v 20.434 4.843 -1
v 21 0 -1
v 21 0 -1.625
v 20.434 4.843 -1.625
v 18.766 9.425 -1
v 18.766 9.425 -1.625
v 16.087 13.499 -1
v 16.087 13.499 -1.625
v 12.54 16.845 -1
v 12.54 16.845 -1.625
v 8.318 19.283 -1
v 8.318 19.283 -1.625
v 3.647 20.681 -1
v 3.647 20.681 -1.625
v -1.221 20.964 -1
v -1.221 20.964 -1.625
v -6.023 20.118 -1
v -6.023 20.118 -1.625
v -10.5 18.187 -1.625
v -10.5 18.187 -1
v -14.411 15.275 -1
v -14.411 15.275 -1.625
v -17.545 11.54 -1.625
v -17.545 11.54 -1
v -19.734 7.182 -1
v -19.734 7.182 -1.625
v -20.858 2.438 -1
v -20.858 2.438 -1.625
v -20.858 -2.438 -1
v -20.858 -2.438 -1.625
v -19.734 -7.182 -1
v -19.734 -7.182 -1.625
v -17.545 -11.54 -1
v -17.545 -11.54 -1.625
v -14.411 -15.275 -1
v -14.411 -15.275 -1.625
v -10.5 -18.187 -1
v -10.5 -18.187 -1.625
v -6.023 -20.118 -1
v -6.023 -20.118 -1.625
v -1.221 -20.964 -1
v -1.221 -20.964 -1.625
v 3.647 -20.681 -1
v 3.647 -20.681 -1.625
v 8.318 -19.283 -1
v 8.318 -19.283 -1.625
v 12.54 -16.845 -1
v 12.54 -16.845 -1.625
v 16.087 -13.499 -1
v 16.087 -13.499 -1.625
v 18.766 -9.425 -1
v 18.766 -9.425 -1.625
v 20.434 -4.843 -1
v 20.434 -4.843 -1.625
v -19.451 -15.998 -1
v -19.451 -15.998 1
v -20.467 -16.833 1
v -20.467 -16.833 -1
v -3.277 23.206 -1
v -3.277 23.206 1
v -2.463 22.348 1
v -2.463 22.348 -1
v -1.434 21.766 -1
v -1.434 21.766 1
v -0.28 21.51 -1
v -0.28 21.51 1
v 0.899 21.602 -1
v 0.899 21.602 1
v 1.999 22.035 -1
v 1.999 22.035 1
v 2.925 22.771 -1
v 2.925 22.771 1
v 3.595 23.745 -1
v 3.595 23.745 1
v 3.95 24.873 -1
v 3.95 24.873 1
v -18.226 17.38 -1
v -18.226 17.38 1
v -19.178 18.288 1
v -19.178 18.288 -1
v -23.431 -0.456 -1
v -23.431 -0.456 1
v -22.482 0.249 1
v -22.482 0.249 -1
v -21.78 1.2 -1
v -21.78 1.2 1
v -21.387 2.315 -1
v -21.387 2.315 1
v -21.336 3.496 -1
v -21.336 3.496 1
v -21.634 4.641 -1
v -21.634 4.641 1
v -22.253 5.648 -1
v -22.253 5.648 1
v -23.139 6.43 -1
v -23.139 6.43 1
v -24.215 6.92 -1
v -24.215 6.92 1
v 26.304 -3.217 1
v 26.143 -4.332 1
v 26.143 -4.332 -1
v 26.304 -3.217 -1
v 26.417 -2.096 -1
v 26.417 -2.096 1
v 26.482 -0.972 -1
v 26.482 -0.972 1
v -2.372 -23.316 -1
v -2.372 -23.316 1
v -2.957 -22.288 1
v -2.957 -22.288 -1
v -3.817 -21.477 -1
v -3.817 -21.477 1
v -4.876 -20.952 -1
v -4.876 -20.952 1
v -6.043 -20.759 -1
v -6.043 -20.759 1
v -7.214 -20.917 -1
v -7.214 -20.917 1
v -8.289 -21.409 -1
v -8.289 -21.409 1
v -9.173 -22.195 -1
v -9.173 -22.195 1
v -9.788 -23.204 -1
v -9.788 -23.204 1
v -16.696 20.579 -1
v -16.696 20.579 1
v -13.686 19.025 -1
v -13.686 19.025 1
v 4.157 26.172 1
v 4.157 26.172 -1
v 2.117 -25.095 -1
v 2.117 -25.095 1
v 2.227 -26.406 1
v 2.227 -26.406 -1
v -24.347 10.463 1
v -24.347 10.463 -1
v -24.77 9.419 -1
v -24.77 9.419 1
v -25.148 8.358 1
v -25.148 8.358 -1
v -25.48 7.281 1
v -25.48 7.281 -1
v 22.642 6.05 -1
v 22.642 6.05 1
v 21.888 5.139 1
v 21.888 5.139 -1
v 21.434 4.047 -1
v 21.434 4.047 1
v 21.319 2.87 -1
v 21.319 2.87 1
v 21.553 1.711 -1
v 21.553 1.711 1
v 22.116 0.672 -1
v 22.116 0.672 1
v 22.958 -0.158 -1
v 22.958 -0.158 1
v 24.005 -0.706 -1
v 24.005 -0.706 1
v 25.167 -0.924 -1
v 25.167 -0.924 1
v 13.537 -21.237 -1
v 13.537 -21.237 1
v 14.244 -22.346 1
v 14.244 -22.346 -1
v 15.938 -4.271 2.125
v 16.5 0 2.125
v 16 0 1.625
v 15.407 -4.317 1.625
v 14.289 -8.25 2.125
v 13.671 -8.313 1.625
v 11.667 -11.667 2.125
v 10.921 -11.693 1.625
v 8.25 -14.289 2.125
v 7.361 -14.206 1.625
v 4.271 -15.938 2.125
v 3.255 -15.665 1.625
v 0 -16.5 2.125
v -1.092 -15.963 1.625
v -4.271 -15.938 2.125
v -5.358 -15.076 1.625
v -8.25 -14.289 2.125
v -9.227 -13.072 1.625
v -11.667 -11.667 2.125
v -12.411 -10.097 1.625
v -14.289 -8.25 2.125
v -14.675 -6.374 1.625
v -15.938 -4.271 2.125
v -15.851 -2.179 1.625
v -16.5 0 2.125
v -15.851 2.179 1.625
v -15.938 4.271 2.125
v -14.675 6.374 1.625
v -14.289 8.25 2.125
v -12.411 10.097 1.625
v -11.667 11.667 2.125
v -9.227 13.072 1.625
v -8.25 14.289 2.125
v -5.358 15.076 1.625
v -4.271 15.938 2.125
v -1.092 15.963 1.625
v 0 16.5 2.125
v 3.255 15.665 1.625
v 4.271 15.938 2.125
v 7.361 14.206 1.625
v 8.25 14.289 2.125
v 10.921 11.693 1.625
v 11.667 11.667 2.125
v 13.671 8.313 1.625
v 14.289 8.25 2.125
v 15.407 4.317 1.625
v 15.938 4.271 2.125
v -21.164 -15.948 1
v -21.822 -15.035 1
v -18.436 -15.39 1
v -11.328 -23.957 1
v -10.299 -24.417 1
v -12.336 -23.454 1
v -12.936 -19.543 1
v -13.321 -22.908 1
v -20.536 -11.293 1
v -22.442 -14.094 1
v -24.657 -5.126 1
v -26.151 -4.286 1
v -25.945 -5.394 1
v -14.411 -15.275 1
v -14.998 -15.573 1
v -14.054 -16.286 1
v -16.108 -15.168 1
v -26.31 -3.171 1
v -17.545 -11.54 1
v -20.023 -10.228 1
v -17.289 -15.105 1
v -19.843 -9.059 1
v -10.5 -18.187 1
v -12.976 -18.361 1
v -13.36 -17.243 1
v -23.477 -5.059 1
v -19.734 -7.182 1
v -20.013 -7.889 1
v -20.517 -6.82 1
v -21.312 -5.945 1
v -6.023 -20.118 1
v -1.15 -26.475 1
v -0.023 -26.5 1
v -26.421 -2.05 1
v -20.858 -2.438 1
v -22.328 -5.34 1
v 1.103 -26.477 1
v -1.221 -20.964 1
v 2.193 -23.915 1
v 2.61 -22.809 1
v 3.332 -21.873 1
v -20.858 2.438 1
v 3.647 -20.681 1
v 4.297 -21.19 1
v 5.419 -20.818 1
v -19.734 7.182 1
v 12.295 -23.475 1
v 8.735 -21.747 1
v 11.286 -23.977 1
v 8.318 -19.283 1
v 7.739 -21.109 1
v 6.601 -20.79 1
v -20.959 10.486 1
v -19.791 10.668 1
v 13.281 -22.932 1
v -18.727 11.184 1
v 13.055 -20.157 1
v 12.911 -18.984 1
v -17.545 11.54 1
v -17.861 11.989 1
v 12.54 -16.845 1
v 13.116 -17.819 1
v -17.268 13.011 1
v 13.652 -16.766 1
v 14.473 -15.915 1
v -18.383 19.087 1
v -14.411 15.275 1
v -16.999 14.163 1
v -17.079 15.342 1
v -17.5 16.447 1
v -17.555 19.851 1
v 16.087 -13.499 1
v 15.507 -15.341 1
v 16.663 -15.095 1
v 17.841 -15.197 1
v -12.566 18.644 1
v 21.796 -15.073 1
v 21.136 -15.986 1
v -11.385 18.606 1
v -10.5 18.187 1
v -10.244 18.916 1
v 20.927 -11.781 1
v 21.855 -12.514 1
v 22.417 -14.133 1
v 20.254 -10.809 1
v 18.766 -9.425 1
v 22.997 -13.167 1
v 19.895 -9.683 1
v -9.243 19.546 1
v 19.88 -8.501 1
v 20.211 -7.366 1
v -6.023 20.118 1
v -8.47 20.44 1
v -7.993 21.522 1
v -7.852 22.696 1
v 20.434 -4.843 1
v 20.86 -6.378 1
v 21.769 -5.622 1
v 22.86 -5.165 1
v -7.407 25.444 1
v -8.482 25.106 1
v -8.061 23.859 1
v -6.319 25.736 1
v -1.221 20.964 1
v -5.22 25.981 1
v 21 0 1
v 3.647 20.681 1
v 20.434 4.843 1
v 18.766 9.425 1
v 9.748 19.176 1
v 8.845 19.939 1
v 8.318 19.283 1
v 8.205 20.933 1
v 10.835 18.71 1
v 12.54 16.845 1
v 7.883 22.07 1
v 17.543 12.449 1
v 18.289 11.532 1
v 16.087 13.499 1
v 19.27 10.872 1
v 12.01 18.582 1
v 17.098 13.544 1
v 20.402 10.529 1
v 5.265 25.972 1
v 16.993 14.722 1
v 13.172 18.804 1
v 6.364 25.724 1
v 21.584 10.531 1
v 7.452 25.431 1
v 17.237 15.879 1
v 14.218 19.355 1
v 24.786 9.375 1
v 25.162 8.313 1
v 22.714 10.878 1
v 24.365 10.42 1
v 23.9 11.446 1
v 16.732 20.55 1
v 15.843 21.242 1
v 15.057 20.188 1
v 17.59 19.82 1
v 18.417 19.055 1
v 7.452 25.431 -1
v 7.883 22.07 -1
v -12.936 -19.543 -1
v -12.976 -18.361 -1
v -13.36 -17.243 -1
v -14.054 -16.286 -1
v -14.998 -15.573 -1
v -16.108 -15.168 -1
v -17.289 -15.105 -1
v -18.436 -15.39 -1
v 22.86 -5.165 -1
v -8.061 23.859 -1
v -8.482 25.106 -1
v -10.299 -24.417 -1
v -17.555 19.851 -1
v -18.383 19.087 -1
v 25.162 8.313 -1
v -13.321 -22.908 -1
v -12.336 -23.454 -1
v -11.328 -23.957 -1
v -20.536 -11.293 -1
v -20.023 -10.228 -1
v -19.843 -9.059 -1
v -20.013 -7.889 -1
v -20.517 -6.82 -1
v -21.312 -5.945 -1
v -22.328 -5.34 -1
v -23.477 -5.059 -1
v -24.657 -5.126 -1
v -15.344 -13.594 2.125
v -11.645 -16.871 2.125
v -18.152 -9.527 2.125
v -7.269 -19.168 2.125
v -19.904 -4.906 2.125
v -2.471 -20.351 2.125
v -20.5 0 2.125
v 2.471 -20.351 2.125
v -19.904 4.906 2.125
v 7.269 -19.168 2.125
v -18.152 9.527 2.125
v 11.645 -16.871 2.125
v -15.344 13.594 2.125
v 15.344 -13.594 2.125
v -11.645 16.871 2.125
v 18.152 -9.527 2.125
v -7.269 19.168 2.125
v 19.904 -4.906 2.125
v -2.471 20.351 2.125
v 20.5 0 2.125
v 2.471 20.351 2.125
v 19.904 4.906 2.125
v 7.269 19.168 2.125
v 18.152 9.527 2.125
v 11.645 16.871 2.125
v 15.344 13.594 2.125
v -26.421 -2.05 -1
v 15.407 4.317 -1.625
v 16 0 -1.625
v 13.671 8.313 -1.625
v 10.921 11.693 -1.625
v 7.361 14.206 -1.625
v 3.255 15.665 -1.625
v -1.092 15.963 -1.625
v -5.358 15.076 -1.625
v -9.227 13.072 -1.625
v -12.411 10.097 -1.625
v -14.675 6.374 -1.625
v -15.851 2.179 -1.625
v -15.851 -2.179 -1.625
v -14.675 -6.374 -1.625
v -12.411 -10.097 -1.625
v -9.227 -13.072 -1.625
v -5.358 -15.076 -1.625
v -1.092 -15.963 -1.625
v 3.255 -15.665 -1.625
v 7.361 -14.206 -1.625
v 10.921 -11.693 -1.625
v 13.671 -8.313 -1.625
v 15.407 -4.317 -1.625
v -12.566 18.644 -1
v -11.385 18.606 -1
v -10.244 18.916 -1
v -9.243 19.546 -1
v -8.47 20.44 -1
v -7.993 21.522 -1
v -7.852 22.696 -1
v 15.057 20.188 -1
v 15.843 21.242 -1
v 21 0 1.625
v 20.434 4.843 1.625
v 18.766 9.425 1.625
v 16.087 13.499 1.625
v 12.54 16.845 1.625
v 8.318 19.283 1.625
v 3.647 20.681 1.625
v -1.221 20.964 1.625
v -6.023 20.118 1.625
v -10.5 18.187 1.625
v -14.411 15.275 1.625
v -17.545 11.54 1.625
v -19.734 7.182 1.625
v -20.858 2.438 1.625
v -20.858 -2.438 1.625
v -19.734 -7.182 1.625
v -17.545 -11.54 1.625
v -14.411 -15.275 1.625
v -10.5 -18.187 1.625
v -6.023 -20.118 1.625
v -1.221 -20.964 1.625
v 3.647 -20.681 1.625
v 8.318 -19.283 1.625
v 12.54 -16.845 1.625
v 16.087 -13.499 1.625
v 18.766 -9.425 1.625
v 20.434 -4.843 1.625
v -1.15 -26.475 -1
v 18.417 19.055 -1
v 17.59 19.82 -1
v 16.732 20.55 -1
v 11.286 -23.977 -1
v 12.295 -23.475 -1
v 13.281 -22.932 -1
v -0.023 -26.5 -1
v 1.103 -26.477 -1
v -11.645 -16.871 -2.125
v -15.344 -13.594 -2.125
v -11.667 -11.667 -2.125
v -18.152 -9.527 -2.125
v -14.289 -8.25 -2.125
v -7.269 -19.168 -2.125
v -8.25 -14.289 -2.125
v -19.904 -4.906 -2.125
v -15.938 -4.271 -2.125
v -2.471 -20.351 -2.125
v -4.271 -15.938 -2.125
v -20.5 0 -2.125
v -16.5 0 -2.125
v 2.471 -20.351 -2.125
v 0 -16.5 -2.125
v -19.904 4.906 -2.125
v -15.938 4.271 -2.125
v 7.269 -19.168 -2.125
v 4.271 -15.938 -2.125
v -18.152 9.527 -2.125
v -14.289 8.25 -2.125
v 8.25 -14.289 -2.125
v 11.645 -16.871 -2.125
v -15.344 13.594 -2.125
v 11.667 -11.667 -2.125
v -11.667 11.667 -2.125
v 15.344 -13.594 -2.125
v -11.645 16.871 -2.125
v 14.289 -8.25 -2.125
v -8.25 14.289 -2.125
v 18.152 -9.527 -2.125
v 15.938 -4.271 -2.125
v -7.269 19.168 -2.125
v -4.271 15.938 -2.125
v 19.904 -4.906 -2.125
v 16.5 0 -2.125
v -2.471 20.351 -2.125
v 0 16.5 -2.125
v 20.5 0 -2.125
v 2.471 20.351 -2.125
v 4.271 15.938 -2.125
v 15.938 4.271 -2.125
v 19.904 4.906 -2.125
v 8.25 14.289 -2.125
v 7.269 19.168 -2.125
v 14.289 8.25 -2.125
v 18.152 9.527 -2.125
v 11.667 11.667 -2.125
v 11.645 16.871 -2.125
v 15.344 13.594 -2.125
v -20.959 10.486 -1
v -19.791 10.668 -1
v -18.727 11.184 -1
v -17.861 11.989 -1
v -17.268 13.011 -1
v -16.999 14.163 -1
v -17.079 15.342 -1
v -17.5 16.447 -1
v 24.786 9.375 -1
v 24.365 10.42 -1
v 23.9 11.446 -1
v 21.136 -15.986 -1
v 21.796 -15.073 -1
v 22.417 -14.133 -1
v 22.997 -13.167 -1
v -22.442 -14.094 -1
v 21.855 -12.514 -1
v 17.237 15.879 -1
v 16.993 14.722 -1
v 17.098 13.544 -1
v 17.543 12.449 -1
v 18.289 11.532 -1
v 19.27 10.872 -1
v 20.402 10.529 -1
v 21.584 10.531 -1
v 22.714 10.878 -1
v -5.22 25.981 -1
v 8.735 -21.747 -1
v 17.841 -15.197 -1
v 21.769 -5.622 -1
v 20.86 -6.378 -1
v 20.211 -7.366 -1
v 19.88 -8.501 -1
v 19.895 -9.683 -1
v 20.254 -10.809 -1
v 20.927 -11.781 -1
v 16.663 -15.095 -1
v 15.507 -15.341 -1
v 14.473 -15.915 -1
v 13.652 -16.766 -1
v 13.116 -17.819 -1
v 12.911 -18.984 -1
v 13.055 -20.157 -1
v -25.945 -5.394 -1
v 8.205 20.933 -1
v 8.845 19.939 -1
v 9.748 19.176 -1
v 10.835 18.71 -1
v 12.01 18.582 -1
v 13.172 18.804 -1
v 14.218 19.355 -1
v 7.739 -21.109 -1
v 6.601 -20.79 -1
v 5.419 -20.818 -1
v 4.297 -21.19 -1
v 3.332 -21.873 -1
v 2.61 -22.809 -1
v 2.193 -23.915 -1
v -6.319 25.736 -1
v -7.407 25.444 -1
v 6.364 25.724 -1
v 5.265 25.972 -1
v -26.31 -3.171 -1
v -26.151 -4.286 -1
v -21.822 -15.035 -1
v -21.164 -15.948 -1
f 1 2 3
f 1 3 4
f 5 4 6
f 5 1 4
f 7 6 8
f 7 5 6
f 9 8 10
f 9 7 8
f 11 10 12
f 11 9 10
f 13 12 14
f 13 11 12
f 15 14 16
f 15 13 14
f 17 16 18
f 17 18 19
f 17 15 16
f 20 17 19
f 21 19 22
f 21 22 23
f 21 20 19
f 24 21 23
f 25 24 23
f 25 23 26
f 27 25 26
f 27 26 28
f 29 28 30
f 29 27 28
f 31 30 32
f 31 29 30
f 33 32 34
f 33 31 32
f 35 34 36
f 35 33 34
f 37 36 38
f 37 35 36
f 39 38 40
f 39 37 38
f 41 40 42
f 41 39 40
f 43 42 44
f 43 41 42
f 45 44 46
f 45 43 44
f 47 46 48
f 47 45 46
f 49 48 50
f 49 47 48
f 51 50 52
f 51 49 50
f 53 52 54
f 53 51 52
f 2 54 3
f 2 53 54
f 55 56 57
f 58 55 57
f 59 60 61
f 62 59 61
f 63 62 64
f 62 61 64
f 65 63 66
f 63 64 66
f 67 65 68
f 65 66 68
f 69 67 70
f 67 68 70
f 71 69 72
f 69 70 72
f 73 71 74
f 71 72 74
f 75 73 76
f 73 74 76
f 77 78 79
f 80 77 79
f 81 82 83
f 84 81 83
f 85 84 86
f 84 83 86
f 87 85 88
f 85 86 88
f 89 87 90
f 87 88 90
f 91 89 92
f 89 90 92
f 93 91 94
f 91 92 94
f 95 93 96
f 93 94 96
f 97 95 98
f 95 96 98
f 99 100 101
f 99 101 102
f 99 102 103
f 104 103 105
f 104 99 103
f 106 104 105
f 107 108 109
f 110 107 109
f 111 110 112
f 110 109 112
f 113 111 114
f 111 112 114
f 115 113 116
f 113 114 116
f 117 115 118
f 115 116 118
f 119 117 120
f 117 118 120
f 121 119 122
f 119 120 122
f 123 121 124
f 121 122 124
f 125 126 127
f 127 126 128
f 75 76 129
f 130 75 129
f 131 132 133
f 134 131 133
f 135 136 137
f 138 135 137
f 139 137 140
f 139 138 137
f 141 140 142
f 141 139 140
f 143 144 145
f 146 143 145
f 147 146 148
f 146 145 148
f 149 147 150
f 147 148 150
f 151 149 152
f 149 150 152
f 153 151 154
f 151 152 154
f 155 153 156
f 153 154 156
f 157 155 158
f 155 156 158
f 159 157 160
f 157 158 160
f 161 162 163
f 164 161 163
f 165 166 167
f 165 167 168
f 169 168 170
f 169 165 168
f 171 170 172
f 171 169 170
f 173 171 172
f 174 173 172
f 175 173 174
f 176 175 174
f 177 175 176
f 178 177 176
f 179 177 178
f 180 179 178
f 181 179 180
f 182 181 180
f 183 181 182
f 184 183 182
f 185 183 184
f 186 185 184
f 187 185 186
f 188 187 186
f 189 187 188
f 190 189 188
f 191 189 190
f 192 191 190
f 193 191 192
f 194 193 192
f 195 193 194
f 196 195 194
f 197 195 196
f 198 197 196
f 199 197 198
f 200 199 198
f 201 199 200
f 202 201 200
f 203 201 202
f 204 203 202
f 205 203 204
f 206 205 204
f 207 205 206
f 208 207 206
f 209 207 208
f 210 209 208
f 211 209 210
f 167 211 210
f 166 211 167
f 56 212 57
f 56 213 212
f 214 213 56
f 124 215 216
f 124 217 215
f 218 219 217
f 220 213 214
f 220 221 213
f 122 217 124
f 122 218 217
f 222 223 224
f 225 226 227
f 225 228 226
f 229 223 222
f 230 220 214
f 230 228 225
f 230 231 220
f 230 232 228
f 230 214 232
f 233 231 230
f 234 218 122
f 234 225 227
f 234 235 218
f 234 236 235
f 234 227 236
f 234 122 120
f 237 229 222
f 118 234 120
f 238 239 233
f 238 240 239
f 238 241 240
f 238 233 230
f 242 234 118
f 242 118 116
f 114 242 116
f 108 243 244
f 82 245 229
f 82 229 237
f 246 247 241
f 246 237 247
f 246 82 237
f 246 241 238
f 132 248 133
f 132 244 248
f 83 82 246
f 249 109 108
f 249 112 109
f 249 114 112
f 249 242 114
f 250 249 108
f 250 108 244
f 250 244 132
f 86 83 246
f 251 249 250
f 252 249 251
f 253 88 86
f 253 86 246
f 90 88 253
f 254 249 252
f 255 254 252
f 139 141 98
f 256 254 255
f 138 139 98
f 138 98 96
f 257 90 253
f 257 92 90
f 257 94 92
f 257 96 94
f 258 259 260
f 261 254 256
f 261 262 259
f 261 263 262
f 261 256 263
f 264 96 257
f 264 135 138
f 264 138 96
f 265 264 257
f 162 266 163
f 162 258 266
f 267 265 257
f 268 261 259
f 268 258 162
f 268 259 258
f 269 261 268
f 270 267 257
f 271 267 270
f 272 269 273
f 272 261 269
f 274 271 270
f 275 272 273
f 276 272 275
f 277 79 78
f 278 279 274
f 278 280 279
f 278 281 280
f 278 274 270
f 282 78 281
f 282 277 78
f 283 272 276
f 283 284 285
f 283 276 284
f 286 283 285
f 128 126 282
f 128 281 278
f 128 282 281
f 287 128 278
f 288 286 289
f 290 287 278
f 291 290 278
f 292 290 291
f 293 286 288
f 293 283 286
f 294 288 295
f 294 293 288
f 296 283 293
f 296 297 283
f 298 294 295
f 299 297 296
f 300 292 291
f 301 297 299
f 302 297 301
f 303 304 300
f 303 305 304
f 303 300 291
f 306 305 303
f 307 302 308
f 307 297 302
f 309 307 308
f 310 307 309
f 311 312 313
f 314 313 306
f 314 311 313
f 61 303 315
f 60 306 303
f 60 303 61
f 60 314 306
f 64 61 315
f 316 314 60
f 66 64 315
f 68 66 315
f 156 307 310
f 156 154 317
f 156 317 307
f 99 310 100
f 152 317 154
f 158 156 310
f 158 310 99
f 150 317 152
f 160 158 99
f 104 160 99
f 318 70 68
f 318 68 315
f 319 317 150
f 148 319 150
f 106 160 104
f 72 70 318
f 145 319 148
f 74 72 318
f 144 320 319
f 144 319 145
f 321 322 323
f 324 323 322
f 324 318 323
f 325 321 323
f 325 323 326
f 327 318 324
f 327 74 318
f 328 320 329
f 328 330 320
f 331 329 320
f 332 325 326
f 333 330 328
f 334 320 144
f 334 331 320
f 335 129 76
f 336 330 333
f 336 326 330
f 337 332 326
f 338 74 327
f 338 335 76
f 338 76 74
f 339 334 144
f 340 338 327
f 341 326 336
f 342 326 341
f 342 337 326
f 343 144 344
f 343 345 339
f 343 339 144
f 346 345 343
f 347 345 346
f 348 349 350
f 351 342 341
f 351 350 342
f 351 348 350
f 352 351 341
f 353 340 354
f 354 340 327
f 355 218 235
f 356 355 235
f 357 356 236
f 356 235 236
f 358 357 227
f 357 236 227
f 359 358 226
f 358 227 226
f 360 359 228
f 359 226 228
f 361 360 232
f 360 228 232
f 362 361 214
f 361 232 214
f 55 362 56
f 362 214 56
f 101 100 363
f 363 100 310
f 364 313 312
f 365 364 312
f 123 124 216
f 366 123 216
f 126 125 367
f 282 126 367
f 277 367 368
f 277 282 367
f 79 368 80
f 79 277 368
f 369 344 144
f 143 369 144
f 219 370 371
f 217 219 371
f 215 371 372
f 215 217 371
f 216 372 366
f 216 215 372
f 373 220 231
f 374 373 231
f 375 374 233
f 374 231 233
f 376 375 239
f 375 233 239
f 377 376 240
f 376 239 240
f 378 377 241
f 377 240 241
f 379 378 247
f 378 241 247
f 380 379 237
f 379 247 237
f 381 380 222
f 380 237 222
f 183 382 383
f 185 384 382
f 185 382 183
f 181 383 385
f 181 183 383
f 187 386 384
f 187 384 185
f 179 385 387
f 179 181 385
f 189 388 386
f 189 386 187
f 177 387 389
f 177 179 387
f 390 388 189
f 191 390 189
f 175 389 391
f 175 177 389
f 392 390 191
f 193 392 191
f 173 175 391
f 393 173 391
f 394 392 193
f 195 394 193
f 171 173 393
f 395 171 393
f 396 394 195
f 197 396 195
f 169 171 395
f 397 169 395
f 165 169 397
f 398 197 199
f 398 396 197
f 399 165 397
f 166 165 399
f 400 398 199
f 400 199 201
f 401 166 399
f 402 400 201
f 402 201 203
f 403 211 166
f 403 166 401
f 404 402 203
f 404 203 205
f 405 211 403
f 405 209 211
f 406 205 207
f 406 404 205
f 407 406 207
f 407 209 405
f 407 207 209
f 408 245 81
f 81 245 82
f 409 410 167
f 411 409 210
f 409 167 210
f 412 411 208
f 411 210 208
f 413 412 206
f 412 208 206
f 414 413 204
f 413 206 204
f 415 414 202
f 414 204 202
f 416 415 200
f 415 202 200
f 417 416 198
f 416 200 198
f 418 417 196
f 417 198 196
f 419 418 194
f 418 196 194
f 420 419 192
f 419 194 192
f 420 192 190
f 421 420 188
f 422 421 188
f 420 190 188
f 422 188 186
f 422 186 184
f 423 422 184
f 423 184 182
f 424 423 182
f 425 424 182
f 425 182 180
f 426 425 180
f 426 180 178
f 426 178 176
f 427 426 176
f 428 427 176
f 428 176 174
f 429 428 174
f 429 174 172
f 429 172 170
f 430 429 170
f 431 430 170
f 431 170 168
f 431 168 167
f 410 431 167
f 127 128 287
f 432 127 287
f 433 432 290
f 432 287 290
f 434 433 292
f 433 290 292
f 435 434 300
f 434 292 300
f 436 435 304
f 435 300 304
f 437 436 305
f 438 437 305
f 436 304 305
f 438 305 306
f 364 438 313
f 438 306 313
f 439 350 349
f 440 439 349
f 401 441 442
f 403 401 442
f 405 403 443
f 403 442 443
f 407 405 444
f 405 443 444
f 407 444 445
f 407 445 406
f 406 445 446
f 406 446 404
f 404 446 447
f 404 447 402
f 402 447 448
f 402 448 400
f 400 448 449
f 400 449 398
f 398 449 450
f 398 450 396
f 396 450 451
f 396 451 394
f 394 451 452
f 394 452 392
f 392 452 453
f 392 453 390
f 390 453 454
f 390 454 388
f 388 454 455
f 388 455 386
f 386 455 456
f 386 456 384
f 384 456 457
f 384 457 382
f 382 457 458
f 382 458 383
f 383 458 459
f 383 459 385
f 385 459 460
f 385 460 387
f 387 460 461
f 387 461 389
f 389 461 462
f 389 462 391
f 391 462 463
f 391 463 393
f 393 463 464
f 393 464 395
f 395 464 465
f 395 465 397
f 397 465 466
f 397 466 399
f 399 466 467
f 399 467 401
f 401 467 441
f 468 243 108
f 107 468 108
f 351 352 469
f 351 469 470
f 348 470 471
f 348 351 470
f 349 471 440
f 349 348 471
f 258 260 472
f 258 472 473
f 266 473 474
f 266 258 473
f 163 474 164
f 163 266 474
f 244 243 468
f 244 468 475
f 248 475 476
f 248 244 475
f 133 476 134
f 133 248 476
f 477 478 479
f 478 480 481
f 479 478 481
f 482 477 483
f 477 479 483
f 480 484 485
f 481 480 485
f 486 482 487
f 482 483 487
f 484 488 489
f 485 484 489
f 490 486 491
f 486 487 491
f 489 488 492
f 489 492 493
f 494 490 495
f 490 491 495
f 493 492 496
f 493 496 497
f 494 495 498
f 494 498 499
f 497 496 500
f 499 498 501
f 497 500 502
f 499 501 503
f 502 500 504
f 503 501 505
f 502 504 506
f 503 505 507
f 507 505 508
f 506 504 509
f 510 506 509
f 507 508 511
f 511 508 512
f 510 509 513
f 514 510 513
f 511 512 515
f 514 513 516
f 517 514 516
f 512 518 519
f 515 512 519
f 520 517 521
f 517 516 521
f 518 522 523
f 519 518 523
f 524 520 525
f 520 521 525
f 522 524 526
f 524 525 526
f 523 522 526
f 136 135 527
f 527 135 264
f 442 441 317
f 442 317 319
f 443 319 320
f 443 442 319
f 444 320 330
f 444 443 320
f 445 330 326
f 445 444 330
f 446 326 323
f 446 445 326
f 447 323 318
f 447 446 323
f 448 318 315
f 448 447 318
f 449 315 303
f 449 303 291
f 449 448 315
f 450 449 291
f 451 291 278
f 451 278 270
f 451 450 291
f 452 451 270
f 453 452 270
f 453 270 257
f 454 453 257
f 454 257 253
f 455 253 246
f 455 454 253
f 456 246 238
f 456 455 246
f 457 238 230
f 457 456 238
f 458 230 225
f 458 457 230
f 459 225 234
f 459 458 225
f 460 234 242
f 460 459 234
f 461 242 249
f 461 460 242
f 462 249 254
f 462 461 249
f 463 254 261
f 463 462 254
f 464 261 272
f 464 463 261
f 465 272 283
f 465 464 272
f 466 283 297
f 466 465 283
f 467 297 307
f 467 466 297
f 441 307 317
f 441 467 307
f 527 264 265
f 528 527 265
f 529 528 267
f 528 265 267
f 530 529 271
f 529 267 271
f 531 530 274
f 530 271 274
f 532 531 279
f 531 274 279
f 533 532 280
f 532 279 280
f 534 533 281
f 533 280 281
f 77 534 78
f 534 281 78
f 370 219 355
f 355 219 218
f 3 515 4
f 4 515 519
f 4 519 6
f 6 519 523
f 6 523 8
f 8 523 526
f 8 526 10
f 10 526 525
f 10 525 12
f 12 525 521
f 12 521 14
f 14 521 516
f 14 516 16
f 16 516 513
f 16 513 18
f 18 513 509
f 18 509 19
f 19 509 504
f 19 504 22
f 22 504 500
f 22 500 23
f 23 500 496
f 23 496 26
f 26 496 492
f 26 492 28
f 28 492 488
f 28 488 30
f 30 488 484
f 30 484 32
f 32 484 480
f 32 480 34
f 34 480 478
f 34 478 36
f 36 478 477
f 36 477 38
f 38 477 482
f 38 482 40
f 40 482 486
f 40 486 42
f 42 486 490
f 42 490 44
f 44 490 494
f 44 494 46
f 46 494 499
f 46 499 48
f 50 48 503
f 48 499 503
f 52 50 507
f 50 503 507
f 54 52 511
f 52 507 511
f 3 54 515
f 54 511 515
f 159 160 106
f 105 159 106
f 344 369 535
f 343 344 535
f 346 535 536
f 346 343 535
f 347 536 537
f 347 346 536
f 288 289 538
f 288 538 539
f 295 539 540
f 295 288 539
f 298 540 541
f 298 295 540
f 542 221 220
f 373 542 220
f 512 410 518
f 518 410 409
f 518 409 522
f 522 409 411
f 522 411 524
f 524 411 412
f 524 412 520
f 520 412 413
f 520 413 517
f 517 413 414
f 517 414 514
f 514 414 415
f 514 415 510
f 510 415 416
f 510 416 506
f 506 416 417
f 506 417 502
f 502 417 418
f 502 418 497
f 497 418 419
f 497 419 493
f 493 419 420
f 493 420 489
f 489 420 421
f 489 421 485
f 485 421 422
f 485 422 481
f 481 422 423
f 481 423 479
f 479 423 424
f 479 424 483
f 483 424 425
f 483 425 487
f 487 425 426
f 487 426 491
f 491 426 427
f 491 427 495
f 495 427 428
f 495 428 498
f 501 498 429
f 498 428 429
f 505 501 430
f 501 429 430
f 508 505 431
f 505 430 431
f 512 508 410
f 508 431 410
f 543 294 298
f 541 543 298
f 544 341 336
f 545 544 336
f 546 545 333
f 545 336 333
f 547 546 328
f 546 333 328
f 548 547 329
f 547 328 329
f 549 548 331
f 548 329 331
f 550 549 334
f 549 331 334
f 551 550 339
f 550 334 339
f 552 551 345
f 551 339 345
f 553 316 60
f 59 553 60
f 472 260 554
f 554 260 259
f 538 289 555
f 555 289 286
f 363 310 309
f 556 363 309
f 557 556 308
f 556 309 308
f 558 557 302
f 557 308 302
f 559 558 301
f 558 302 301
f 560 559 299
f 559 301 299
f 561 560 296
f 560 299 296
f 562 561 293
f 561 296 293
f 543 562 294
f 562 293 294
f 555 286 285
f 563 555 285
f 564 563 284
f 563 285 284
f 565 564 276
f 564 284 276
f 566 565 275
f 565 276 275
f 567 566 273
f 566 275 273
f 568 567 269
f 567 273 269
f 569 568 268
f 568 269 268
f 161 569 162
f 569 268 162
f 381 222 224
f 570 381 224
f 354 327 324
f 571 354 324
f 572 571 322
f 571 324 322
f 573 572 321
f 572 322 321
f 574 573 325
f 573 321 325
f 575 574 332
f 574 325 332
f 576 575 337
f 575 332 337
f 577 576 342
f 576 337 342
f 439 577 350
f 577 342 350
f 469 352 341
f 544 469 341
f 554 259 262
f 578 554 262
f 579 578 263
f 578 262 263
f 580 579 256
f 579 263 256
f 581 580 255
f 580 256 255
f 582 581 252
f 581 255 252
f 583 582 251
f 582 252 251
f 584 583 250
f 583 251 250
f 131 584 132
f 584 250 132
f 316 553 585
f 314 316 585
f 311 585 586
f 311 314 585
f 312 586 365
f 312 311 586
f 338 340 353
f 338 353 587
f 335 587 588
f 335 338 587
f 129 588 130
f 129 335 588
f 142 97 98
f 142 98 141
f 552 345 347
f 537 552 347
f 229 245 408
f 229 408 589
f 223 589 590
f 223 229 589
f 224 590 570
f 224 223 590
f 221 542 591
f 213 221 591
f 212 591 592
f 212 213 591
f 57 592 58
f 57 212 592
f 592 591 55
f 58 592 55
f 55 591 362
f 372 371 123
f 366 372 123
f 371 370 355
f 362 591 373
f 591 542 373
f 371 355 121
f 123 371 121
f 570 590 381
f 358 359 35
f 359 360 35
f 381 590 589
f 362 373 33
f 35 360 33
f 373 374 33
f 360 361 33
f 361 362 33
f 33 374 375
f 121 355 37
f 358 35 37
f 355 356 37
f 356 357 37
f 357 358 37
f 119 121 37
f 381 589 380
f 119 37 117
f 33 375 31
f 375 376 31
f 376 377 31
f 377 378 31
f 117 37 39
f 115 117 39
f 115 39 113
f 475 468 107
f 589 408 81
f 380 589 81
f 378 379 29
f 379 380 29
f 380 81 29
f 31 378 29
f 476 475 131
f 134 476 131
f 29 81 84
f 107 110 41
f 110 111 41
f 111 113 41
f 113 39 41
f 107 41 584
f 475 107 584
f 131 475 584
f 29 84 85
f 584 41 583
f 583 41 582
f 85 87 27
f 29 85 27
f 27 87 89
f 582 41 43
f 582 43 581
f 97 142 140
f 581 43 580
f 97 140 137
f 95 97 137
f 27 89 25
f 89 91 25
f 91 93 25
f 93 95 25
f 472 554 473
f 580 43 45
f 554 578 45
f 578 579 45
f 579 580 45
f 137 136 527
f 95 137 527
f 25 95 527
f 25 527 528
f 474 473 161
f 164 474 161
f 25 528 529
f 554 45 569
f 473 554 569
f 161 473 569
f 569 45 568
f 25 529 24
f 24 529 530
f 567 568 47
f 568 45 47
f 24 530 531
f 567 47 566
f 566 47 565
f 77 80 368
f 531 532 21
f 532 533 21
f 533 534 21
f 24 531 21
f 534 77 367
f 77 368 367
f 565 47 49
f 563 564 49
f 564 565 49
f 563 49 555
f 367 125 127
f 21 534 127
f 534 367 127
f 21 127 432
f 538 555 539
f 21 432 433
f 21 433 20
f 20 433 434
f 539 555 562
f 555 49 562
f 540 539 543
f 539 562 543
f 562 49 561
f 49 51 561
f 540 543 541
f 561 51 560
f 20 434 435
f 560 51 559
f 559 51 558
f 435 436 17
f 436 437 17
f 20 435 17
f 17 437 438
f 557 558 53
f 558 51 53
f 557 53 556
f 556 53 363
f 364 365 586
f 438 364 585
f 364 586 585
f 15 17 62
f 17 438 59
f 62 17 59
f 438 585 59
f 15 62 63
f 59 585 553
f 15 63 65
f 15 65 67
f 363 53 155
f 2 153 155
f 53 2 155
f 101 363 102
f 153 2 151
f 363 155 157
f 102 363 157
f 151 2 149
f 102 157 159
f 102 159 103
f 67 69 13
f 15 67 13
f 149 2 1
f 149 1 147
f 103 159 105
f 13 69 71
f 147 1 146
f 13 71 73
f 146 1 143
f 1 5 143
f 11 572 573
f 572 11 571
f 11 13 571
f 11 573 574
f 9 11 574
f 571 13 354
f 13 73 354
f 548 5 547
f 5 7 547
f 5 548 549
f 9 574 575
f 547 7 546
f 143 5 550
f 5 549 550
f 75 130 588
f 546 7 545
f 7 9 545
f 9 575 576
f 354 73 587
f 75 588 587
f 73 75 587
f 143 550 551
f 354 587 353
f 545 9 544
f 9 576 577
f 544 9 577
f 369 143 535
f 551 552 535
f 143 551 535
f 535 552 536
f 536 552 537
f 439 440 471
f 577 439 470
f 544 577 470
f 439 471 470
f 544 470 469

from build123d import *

# Parameters (mm, degrees)
ESQUISSE1_R                  = 26.5
EXTRUSION1_DEPTH             = 1
ENL_V_MAT_EXTRU_1_DEPTH      = 2
R_P_TITION_CIRCULAIRE1_COUNT = 13
ESQUISSE3_R                  = 21
EXTRUSION2_DEPTH             = 2.125
ESQUISSE4_R                  = 16
ENL_V_MAT_EXTRU_2_DEPTH      = 3.125
ENL_V_MAT_EXTRU_2_DEPTH_BACK = 3.125
CHANFREIN1_SIZE              = 0.5


with BuildPart() as part:
    # Esquisse1 → Extrusion1 (new body, symmetric)
    with BuildSketch(Plane.XY):
        Circle(ESQUISSE1_R)
    extrude(amount=EXTRUSION1_DEPTH, both=True)

    # Esquisse2 → Enlèv. mat.-Extru.1 (cut, symmetric)
    with BuildSketch(Plane.XY):
        with BuildLine():
            Line((-5.219783613, 25.98083638), (-3.276608177, 23.205694255))
            ThreePointArc((-3.276608177, 23.205694255), (0.898959157, 21.60232474), (3.95048165, 24.87254902))
            Line((3.95048165, 24.87254902), (4.156862745, 26.171940931))
            ThreePointArc((4.156862745, 26.171940931), (-0.53998188, 26.494497911), (-5.219783613, 25.98083638))
        make_face()
    enl_v_mat_extru_1 = extrude(amount=ENL_V_MAT_EXTRU_1_DEPTH, both=True, mode=Mode.SUBTRACT)

    # Répétition circulaire1: Enlèv. mat.-Extru.1 ×13 about axis
    r_p_tition_circulaire1_axis = Axis((0, 0, 0), (0, 0, 1))
    for i in range(1, R_P_TITION_CIRCULAIRE1_COUNT):
        add(enl_v_mat_extru_1.rotate(r_p_tition_circulaire1_axis, i * 360 / R_P_TITION_CIRCULAIRE1_COUNT), mode=Mode.SUBTRACT)

    # Esquisse3 → Extrusion2 (add, symmetric)
    with BuildSketch(Plane.XY):
        Circle(ESQUISSE3_R)
    extrude(amount=EXTRUSION2_DEPTH, both=True)

    # Esquisse4 → Enlèv. mat.-Extru.2 (cut, two sides)
    with BuildSketch(Plane.XY) as enl_v_mat_extru_2_sk:
        Circle(ESQUISSE4_R)
    extrude(amount=ENL_V_MAT_EXTRU_2_DEPTH, mode=Mode.SUBTRACT)
    extrude(enl_v_mat_extru_2_sk.sketch, amount=-ENL_V_MAT_EXTRU_2_DEPTH_BACK, mode=Mode.SUBTRACT)

    # Chanfrein1
    chanfrein1_edges = [part.edges().sort_by_distance(p)[0] for p in [
        (-21, 0, -2.125),
        (-21, 0, 2.125),
        (-16, 0, -2.125),
        (-16, 0, 2.125),
    ]]
    chamfer(chanfrein1_edges, length=CHANFREIN1_SIZE)


solid = part.part
